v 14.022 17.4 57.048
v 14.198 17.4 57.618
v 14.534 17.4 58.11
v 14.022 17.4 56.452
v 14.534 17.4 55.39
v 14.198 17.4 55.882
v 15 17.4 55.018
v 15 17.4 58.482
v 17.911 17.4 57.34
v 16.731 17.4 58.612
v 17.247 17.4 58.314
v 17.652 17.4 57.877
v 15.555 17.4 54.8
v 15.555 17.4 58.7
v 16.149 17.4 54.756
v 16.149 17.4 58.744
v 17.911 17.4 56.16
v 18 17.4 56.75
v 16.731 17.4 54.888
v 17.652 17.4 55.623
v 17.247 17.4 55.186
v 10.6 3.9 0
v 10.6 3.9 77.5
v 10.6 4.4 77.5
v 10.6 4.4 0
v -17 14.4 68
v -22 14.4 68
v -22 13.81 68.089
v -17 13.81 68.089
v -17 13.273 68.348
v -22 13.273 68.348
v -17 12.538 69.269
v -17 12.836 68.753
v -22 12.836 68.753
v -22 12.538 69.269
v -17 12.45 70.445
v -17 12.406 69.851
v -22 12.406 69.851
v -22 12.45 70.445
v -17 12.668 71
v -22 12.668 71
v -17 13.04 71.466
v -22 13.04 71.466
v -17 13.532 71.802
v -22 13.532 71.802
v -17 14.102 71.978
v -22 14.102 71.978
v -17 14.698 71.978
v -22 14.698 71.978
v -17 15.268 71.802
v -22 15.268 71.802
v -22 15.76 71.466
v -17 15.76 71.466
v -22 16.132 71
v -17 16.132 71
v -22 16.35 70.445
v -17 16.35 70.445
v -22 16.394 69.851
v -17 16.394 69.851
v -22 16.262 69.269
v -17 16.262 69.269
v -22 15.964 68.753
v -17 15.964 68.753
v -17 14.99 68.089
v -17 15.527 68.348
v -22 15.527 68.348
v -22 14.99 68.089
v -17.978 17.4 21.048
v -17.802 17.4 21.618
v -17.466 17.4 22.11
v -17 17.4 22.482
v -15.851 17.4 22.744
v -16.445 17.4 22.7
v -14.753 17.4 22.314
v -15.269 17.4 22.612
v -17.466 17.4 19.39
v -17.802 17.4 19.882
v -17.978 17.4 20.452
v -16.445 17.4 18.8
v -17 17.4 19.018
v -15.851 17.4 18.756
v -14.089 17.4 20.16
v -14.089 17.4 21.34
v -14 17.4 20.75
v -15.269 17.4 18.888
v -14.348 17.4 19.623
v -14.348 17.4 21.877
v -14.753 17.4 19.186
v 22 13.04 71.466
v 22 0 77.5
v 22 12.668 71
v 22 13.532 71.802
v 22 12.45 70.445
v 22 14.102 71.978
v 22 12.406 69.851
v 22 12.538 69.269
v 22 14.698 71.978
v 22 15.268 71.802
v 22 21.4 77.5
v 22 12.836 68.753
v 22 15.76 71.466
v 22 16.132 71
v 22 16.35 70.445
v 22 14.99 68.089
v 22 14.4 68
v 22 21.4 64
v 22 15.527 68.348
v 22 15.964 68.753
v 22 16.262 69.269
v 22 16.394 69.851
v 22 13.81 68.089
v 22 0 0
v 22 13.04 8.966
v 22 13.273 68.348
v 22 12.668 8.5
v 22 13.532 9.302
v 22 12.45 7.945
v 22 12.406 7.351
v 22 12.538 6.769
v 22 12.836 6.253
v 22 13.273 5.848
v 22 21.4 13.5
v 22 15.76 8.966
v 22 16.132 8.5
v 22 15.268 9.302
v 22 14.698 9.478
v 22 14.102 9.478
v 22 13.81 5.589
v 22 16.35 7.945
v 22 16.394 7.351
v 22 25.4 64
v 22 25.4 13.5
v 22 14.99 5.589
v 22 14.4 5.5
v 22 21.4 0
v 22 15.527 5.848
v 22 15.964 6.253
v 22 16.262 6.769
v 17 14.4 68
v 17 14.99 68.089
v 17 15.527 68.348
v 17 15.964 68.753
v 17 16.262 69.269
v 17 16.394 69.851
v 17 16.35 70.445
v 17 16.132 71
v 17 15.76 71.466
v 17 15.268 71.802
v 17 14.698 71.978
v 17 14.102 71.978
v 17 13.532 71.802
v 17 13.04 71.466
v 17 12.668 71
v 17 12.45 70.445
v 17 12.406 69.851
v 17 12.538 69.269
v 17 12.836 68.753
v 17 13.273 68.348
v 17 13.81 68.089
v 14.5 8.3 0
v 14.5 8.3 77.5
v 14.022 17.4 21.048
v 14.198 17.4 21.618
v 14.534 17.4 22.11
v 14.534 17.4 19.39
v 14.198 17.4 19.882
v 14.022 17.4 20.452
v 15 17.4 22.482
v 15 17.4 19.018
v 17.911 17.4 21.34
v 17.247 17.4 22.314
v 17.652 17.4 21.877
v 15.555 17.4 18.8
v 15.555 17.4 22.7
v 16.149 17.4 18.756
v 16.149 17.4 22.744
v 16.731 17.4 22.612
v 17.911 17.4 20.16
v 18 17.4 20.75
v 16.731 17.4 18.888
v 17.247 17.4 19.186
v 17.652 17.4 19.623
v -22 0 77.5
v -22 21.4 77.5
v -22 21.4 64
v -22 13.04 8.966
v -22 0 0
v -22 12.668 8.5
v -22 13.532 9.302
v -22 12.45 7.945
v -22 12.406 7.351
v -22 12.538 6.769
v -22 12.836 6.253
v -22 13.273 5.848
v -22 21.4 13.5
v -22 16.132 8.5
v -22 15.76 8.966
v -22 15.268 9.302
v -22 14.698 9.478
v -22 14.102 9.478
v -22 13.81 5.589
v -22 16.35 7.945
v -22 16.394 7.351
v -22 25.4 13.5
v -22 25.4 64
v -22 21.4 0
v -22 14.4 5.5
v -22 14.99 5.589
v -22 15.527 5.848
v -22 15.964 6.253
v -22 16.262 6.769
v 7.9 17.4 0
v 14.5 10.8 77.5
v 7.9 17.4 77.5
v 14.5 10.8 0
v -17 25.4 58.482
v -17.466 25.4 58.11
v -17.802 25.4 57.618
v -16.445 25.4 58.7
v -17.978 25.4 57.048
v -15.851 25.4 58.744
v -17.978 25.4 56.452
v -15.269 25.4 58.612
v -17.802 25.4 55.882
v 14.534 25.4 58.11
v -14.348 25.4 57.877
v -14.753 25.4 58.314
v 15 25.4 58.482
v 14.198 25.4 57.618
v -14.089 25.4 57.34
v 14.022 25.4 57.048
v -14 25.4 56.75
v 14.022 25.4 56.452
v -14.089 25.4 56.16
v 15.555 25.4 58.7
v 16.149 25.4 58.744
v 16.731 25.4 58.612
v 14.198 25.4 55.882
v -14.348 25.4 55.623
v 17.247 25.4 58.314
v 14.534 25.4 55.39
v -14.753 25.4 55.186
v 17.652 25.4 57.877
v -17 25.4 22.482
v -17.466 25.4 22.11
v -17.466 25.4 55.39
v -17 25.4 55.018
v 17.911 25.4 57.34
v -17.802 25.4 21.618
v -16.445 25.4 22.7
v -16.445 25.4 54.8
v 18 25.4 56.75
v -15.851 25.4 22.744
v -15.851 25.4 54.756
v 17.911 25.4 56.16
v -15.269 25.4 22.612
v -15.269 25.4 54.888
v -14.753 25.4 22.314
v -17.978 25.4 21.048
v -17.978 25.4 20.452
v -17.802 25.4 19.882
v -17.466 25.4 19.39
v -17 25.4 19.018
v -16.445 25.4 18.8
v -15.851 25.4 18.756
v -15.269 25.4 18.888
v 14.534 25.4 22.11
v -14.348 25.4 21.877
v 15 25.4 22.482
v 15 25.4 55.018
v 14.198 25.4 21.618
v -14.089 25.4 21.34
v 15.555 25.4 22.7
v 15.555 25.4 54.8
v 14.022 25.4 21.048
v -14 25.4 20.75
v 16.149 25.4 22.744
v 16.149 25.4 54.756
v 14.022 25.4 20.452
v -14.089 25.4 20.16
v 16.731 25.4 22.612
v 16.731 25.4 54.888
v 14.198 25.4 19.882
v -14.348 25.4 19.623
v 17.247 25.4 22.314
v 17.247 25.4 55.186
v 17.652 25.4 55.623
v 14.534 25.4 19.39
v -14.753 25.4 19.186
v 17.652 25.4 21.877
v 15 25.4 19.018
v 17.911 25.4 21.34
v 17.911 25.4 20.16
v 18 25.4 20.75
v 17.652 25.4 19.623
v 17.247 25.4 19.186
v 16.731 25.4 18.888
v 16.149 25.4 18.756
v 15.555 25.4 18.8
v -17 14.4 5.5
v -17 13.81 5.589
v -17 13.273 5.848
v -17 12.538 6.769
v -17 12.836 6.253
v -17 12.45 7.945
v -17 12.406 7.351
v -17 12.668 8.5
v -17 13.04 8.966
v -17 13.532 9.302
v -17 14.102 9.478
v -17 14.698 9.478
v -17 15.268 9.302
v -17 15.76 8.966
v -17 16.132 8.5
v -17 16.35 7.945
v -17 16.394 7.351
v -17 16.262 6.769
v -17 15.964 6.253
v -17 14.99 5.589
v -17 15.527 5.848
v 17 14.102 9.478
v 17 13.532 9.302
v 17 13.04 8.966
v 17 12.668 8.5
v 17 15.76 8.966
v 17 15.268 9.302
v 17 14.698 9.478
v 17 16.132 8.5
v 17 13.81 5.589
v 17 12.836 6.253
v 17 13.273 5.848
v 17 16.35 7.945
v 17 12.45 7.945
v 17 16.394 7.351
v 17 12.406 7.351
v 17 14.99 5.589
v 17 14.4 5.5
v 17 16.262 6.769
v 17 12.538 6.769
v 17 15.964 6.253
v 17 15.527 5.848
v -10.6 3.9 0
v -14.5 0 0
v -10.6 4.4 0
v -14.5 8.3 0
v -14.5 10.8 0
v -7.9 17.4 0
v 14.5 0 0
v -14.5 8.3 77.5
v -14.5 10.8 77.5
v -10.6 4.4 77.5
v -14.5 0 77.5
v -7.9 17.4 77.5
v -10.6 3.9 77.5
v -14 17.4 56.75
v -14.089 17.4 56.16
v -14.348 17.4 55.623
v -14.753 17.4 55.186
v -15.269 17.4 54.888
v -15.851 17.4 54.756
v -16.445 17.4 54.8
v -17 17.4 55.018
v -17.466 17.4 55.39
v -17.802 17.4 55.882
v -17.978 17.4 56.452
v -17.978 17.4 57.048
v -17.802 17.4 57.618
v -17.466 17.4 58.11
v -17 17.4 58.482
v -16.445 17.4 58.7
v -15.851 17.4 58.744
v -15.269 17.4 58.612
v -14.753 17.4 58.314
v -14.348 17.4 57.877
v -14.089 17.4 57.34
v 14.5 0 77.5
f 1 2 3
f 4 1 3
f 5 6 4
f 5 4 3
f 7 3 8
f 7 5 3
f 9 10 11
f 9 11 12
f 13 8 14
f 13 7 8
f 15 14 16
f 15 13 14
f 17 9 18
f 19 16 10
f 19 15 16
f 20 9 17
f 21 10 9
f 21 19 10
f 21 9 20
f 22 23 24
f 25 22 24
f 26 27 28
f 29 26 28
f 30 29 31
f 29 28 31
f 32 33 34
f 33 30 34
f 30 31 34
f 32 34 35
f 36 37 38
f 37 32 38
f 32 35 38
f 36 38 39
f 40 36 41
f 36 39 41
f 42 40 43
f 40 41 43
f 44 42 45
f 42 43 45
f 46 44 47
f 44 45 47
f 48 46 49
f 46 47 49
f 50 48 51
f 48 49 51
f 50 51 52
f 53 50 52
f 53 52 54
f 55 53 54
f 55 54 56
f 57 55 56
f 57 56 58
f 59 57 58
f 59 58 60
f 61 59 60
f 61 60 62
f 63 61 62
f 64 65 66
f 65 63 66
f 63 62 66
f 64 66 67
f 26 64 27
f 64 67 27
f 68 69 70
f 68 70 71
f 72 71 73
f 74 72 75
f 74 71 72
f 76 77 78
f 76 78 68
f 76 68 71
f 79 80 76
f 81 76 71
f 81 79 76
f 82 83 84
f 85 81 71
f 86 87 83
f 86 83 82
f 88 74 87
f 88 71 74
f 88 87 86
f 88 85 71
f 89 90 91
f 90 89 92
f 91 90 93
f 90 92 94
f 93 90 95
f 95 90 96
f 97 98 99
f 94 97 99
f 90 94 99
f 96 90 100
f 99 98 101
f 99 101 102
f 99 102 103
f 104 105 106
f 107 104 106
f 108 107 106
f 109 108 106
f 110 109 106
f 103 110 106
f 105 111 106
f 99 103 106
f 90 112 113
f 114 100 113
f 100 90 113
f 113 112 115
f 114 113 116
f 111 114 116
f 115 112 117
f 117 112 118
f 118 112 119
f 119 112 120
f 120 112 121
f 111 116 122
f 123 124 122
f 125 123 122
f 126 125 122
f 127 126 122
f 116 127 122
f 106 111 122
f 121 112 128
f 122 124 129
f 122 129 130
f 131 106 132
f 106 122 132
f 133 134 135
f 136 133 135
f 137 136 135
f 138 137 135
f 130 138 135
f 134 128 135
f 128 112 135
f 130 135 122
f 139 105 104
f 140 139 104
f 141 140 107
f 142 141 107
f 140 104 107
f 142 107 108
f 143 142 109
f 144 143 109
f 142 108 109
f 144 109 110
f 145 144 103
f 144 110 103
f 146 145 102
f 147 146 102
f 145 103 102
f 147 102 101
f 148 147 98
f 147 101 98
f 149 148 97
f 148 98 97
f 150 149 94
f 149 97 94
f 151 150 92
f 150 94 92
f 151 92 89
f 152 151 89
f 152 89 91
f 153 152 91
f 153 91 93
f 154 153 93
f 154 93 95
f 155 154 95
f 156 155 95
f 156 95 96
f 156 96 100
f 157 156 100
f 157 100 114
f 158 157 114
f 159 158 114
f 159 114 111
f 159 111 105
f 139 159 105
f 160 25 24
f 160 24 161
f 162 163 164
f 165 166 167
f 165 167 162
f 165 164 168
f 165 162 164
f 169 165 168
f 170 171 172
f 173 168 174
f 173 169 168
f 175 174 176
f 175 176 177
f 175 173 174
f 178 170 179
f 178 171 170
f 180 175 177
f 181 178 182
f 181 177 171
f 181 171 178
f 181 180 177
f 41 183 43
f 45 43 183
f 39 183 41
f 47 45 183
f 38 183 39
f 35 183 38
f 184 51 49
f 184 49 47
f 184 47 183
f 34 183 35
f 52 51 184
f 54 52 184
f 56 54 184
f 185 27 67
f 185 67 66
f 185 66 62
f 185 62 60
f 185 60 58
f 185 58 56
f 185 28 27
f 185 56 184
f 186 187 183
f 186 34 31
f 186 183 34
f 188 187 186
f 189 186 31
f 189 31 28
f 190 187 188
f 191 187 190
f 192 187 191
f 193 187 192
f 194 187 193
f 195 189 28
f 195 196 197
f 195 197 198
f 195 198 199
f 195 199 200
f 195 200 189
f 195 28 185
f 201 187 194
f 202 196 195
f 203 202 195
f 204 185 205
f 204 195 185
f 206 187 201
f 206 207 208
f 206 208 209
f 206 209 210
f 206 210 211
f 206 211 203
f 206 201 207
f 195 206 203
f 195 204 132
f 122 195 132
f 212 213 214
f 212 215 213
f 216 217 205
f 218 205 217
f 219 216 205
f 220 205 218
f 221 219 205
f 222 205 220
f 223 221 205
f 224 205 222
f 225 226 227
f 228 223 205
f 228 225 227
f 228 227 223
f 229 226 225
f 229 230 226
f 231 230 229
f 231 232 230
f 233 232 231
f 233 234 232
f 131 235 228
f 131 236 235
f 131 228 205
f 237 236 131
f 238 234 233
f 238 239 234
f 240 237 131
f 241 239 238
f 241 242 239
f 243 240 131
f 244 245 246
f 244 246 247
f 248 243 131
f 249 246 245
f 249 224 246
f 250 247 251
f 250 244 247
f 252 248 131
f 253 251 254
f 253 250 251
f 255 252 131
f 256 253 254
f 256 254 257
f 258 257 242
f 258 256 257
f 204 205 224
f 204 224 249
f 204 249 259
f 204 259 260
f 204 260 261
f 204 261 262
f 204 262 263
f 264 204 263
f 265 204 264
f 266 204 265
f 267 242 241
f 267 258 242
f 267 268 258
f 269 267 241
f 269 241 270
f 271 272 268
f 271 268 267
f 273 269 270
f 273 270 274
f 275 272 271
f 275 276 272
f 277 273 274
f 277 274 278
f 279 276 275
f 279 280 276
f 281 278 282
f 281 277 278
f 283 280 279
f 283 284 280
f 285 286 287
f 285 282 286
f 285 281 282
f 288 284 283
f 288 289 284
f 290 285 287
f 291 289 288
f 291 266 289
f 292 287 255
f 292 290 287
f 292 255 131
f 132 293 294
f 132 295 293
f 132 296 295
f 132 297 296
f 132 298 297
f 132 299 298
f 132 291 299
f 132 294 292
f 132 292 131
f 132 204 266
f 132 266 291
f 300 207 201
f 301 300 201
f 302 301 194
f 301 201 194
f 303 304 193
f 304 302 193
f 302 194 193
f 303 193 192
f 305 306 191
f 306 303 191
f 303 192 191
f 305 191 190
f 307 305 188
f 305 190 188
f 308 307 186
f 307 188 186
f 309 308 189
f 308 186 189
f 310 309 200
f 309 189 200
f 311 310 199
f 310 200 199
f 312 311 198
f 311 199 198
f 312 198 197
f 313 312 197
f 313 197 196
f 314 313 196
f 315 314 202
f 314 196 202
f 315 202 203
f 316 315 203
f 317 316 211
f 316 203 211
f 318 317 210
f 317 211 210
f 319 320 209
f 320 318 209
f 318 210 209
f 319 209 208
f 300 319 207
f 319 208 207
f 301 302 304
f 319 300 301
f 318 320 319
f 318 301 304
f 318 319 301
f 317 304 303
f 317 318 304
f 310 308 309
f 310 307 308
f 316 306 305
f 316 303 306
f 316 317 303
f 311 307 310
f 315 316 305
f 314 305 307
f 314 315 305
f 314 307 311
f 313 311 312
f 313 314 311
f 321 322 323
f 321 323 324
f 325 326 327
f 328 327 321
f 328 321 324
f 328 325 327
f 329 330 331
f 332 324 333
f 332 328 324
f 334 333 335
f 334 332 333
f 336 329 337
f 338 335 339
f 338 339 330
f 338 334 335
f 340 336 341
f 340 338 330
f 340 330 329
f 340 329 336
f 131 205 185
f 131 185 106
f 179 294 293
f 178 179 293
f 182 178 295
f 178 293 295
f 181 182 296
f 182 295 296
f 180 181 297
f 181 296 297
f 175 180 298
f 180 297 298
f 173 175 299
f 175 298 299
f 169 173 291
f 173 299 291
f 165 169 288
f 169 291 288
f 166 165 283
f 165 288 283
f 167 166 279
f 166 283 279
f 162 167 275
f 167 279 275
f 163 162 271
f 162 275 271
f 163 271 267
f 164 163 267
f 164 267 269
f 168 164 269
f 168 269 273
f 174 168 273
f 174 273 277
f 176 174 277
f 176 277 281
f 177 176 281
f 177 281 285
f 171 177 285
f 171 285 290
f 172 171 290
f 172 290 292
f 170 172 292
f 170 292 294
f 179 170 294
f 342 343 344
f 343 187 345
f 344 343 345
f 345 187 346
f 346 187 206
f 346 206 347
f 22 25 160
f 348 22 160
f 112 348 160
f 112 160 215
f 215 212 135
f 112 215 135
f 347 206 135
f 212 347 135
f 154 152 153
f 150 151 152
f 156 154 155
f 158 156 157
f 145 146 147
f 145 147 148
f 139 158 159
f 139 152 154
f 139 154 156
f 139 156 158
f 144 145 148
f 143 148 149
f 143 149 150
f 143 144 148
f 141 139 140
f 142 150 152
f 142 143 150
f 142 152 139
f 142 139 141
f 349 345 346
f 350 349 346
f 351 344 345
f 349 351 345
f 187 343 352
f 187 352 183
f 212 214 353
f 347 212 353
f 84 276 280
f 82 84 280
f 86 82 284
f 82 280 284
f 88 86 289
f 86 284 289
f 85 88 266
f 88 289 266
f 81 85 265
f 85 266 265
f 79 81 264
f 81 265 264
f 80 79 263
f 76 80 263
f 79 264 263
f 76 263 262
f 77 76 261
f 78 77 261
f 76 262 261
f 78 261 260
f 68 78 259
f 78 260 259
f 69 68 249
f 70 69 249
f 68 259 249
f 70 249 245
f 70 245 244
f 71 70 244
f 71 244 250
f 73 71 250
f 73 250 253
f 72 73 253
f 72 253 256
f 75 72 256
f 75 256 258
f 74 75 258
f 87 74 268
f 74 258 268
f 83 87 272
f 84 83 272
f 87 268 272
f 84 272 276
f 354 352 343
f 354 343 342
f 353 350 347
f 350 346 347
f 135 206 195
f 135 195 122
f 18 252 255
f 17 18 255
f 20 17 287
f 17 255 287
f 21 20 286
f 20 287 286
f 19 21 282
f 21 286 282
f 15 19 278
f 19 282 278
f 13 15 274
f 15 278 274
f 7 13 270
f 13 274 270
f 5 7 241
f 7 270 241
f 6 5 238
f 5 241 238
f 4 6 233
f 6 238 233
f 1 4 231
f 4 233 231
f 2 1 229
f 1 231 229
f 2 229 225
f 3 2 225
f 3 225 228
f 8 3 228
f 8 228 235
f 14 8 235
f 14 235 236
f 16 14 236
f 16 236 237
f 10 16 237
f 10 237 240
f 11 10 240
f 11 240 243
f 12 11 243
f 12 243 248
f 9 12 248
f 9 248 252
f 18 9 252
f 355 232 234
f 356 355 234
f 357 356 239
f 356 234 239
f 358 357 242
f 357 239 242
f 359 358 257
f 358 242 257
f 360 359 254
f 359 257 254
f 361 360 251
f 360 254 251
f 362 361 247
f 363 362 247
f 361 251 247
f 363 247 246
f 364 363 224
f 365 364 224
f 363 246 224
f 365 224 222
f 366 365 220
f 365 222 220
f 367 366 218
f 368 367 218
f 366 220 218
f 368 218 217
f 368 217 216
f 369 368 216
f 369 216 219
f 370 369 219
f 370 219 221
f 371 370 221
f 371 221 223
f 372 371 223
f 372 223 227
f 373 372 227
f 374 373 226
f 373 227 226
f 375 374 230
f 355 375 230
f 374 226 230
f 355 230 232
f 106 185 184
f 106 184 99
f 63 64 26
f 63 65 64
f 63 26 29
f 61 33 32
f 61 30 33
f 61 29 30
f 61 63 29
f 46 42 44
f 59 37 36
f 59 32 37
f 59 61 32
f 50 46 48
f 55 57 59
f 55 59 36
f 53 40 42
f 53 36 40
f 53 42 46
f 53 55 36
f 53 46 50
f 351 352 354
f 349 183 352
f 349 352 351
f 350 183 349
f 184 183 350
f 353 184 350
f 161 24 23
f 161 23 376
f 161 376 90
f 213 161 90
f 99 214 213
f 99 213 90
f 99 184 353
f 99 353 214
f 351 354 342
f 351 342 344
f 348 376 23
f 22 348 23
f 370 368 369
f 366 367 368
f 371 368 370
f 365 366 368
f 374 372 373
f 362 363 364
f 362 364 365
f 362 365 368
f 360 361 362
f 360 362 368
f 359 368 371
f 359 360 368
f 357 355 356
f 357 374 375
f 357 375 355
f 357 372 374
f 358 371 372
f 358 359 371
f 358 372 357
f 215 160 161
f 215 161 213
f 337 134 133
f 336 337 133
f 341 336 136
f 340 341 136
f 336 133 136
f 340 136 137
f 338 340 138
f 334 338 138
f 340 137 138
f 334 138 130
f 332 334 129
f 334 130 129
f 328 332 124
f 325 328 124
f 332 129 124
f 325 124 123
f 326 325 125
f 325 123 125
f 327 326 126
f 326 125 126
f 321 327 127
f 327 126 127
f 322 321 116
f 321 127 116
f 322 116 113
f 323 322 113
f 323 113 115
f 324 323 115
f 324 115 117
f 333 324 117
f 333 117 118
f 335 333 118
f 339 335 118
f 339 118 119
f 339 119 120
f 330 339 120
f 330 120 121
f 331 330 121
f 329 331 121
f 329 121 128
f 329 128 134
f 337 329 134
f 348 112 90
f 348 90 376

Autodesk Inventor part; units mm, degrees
ref_plane "YZ Plane" through (0, 0, 0) normal (1, 0, 0) x (0, 1, 0)
ref_plane "XZ Plane" through (0, 0, 0) normal (0, 1, 0) x (-1, 0, 0)
ref_plane "XY Plane" through (0, 0, 0) normal (0, 0, 1) x (1, 0, 0)
sketch "Sketch1" plane through (0, 0, 0) normal (0, 0, 1) x (1, 0, 0)
  line L0 (0, 0) -> (-22, 0)
  line L1 (-22, 0) -> (-22, 0)
  line L2 (-22, 0) -> (-14.5, 0)
  line L3 (-22, 0) -> (-22, 25.4)
  line L4 (-22, 25.4) -> (0, 25.4)
  line L5 (-29.0722, -4.6) -> (-18.7593, -4.6) construction
  line L6 (-22, 0) -> (0, 0) construction
  line L7 (0, 0) -> (22, 0) construction
  line L8 (0, -10.6) -> (0, 31.4) construction
  line L9 (0, -4.6) -> (0, 12.9) construction
  line L10 (0, -4.6) -> (-10, -4.6) construction
  line L11 (0, -4.6) -> (10, -4.6) construction
  line L12 (-10, -4.6) -> (-10, 0) construction
  line L13 (-10, 0) -> (-6.1, 3.9) construction
  line L14 (-6.1, 3.9) -> (-6.1, 4.4) construction
  line L15 (-6.1, 4.4) -> (-10, 8.3) construction
  line L16 (-10, 8.3) -> (-10, 10.8) construction
  line L17 (-10, 10.8) -> (-7.9, 12.9) construction
  line L18 (-7.9, 12.9) -> (0, 12.9) construction
  line L19 (10, 0) -> (6.1, 3.9) construction
  line L20 (6.1, 3.9) -> (6.1, 4.4) construction
  line L21 (6.1, 4.4) -> (10, 8.3) construction
  line L22 (10, 8.3) -> (10, 10.8) construction
  line L23 (10, 10.8) -> (7.9, 12.9) construction
  line L24 (10, -4.6) -> (10, 0) construction
  line L25 (7.9, 12.9) -> (0, 12.9) construction
  line L26 (-14.5, 8.3) -> (-14.5, 10.8)
  line L27 (-14.5, 10.8) -> (-7.9, 17.4)
  line L28 (-7.9, 17.4) -> (0, 17.4)
  line L29 (-14.5, 0) -> (-10.6, 3.9)
  line L30 (-10.6, 3.9) -> (-10.6, 4.4)
  line L31 (-10.6, 4.4) -> (-14.5, 8.3)
  line L32 (-10.6, 3.9) -> (-6.1, 3.9) construction
  line L33 (-10, 8.3) -> (-14.5, 8.3) construction
  line L34 (22, 0) -> (14.5, 0)
  line L35 (22, 0) -> (22, 25.4)
  line L36 (22, 25.4) -> (0, 25.4)
  line L37 (14.5, 8.3) -> (14.5, 10.8)
  line L38 (14.5, 10.8) -> (7.9, 17.4)
  line L39 (7.9, 17.4) -> (0, 17.4)
  line L40 (14.5, 0) -> (10.6, 3.9)
  line L41 (10.6, 3.9) -> (10.6, 4.4)
  line L42 (10.6, 4.4) -> (14.5, 8.3)
  point P0 (-3.95, 17.4)
  dimension "d0" = 4.6
  dimension "d1" = 44
  dimension "d3" = 17.5
  dimension "d4" = 20
  dimension "d5" = 4.6
  dimension "d6" = 8.5
  dimension "d7" = 135
  dimension "d8" = 0.5
  dimension "d9" = 135
  dimension "d10" = 2.5
  dimension "d11" = 7.5
  dimension "d12" = 25.4
  dimension "d13" = 45
  dimension "d14" = 135
  dimension "d15" = 2.5
  dimension "d16" = 0.5
  dimension "d17" = 135
  dimension "d19" = 4.5
extrude "Extrusion1" add sketch "Sketch1" along normal blind 77.5
sketch "Sketch2" plane through (-22, 25.4, 0) normal (0, 1, 0) x (1, 0, 0)
  circle A0 centre (6, -20.75) radius 2
  circle A1 centre (6, -56.75) radius 2
  line L0 (6, -20.75) -> (6, -56.75)
  circle A2 centre (38, -20.75) radius 2
  circle A3 centre (38, -56.75) radius 2
  line L1 (38, -20.75) -> (38, -56.75) construction
  line L2 (22, 0) -> (22, -77.5) construction
  line L3 (44, -77.5) -> (0, -77.5) construction
  line L4 (38, -38.75) -> (22, -38.75) construction
  line L5 (6, -38.75) -> (22, -38.75) construction
  line L6 (0, 0) -> (0, -77.5) construction
  line L7 (44, -64) -> (0, -64) construction
  line L8 (0, -64) -> (0, -13.5) construction
  line L9 (0, -13.5) -> (44, -13.5) construction
  line L10 (44, -13.5) -> (44, -64) construction
  line L11 (44, -64) -> (0, -13.5) construction
  line L12 (0, -64) -> (44, -13.5) construction
  line L13 (44, 0) -> (44, -77.5) projected
  line L14 (0, -13.5) -> (44, -13.5)
  line L15 (44, -13.5) -> (44, 0)
  line L16 (44, 0) -> (0, 0)
  line L17 (0, 0) -> (0, -13.5)
  line L18 (0, -64) -> (44, -64)
  line L19 (44, -64) -> (44, -77.5)
  line L20 (44, -77.5) -> (0, -77.5)
  line L21 (0, -77.5) -> (0, -64)
  point P0 (7.5, -77.5)
  dimension "d22" = 36
  dimension "d23" = 4
  dimension "d24" = 4
  dimension "d25" = 36
  dimension "d26" = 4
  dimension "d27" = 4
  dimension "d29" = 32
  dimension "d30" = 50.5
extrude "Extrusion2" cut sketch "Sketch2" against normal blind 8 contours A0 | A1 | A2 | A3
extrude "Extrusion3" cut sketch "Sketch2" against normal blind 4 contours L13 L20 L21 L18 | L13 L14 L17 L16
sketch "Sketch3" plane through (22, 0, 77.5) normal (1, 0, 0) x (0, 0, -1)
  circle A0 centre (7.5, 14.4) radius 2
  circle A1 centre (70, 14.4) radius 2
  line L0 (64, 21.4) -> (64, 25.4) projected
  line L1 (13.5, 25.4) -> (13.5, 21.4) projected
  line L2 (13.5, 21.4) -> (0, 21.4) projected
  line L3 (77.5, 21.4) -> (64, 21.4) projected
  point P0 (77.5, 0)
  point P1 (64, 23.4)
  dimension "d35" = 6
  dimension "d36" = 6
  dimension "d37" = 7
  dimension "d38" = 7
  dimension "d39" = 4
  dimension "d40" = 4
extrude "Extrusion4" cut sketch "Sketch3" against normal blind 5
mirror "Mirror1" about plane through (0, 0, 0) normal (1, 0, 0) of "Extrusion4"
equation "\"d15\" = d10"
equation "\"d16\" = d8"
properties part number "HGH20CA Slider Block"
